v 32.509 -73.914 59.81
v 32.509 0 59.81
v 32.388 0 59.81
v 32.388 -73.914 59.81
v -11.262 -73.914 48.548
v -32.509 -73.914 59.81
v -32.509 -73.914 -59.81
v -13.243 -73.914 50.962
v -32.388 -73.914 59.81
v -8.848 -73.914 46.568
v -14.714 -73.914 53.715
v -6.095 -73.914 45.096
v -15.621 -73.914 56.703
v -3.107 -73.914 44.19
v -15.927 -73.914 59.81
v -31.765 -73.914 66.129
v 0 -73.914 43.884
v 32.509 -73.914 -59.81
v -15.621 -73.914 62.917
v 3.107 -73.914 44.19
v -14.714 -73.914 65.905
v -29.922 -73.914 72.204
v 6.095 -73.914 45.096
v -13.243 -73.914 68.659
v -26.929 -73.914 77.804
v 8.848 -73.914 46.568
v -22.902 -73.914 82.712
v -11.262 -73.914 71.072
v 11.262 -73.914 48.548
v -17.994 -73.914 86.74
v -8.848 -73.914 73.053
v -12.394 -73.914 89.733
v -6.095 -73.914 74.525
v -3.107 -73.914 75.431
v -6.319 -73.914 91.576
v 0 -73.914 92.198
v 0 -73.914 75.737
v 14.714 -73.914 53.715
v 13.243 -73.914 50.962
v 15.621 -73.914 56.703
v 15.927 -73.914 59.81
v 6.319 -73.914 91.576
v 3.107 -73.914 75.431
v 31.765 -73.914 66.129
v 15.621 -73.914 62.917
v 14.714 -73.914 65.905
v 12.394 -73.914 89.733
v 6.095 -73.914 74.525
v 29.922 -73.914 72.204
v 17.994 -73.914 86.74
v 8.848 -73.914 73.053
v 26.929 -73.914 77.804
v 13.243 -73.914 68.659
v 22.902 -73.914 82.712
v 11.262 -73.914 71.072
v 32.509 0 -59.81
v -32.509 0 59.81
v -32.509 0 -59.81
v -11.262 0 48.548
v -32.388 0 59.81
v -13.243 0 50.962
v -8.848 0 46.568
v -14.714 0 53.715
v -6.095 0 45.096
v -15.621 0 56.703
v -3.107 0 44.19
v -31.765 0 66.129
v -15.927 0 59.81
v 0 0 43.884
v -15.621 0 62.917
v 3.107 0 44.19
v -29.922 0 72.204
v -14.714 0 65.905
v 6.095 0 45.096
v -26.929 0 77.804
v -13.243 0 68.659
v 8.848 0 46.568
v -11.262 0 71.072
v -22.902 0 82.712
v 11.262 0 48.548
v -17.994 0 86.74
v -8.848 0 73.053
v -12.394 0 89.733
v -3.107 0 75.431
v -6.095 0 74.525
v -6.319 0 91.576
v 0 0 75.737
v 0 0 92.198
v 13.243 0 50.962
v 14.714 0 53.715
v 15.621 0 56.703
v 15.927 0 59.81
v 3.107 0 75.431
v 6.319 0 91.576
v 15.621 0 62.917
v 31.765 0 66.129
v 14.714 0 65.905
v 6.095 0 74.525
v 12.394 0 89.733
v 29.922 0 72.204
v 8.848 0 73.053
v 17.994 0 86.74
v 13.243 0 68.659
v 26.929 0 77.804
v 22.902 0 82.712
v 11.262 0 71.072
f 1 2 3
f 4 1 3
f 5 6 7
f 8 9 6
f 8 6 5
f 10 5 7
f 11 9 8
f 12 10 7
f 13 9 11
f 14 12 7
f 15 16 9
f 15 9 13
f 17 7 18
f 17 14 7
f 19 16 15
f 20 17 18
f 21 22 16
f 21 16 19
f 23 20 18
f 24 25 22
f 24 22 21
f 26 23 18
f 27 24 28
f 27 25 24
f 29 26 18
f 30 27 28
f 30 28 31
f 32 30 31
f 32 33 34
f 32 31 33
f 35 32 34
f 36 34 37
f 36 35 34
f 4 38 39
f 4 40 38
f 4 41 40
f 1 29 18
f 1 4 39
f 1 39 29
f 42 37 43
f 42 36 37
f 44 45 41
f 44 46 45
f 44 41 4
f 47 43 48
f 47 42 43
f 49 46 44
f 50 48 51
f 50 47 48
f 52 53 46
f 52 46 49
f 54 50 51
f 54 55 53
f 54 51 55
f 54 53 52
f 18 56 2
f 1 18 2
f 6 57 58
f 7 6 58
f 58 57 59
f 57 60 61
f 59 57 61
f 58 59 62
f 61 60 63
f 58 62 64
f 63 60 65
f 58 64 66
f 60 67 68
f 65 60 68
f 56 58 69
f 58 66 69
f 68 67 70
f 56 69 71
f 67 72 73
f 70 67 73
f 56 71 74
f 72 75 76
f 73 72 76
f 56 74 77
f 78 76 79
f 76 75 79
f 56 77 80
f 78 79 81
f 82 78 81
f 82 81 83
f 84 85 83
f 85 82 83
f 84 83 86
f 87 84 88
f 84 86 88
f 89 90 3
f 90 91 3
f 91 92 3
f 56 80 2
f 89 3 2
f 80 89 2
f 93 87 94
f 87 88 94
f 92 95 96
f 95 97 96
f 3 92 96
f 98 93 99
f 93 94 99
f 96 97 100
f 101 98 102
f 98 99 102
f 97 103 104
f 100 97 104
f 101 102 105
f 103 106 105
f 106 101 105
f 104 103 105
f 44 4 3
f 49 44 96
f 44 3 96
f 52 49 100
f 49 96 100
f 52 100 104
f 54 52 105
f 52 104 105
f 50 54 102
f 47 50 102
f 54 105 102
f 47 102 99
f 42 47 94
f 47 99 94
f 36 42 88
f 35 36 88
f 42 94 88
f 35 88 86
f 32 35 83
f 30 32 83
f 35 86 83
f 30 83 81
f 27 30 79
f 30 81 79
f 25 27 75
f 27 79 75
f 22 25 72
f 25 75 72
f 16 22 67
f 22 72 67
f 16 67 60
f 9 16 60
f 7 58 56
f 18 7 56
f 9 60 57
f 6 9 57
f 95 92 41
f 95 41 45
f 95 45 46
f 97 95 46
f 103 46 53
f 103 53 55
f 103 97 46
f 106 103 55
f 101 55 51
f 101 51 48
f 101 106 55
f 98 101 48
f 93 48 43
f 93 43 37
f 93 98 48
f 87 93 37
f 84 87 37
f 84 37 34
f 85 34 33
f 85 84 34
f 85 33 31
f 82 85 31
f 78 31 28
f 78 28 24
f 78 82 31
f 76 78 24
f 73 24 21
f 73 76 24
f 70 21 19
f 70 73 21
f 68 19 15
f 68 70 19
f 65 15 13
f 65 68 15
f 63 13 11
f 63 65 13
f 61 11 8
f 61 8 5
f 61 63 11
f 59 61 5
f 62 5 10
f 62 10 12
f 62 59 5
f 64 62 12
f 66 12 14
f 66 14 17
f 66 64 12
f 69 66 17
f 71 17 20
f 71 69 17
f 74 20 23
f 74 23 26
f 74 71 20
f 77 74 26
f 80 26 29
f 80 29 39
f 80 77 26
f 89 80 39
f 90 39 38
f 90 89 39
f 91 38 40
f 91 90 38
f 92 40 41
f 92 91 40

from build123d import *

# Parameters (mm, degrees)
F0_R     = 15.926715
F1_DEPTH = 73.914


with BuildPart() as f1:
    # F0 (on Front) → F1 (new body)
    with BuildSketch(Plane.XZ):
        with BuildLine():
            Line((-32.508995, -59.810236), (32.508995, -59.810236))
            Line((32.508995, -59.810236), (32.508995, 59.810236))
            Line((32.508995, 59.810236), (32.387727, 59.810236))
            ThreePointArc((32.387727, 59.810236), (0, 92.197963), (-32.387727, 59.810236))
            Line((-32.387727, 59.810236), (-32.508995, 59.810236))
            Line((-32.508995, 59.810236), (-32.508995, -59.810236))
        make_face()
        with Locations((0, 59.810236)):
            Circle(F0_R, mode=Mode.SUBTRACT)
    extrude(amount=F1_DEPTH)


solid = f1.part
